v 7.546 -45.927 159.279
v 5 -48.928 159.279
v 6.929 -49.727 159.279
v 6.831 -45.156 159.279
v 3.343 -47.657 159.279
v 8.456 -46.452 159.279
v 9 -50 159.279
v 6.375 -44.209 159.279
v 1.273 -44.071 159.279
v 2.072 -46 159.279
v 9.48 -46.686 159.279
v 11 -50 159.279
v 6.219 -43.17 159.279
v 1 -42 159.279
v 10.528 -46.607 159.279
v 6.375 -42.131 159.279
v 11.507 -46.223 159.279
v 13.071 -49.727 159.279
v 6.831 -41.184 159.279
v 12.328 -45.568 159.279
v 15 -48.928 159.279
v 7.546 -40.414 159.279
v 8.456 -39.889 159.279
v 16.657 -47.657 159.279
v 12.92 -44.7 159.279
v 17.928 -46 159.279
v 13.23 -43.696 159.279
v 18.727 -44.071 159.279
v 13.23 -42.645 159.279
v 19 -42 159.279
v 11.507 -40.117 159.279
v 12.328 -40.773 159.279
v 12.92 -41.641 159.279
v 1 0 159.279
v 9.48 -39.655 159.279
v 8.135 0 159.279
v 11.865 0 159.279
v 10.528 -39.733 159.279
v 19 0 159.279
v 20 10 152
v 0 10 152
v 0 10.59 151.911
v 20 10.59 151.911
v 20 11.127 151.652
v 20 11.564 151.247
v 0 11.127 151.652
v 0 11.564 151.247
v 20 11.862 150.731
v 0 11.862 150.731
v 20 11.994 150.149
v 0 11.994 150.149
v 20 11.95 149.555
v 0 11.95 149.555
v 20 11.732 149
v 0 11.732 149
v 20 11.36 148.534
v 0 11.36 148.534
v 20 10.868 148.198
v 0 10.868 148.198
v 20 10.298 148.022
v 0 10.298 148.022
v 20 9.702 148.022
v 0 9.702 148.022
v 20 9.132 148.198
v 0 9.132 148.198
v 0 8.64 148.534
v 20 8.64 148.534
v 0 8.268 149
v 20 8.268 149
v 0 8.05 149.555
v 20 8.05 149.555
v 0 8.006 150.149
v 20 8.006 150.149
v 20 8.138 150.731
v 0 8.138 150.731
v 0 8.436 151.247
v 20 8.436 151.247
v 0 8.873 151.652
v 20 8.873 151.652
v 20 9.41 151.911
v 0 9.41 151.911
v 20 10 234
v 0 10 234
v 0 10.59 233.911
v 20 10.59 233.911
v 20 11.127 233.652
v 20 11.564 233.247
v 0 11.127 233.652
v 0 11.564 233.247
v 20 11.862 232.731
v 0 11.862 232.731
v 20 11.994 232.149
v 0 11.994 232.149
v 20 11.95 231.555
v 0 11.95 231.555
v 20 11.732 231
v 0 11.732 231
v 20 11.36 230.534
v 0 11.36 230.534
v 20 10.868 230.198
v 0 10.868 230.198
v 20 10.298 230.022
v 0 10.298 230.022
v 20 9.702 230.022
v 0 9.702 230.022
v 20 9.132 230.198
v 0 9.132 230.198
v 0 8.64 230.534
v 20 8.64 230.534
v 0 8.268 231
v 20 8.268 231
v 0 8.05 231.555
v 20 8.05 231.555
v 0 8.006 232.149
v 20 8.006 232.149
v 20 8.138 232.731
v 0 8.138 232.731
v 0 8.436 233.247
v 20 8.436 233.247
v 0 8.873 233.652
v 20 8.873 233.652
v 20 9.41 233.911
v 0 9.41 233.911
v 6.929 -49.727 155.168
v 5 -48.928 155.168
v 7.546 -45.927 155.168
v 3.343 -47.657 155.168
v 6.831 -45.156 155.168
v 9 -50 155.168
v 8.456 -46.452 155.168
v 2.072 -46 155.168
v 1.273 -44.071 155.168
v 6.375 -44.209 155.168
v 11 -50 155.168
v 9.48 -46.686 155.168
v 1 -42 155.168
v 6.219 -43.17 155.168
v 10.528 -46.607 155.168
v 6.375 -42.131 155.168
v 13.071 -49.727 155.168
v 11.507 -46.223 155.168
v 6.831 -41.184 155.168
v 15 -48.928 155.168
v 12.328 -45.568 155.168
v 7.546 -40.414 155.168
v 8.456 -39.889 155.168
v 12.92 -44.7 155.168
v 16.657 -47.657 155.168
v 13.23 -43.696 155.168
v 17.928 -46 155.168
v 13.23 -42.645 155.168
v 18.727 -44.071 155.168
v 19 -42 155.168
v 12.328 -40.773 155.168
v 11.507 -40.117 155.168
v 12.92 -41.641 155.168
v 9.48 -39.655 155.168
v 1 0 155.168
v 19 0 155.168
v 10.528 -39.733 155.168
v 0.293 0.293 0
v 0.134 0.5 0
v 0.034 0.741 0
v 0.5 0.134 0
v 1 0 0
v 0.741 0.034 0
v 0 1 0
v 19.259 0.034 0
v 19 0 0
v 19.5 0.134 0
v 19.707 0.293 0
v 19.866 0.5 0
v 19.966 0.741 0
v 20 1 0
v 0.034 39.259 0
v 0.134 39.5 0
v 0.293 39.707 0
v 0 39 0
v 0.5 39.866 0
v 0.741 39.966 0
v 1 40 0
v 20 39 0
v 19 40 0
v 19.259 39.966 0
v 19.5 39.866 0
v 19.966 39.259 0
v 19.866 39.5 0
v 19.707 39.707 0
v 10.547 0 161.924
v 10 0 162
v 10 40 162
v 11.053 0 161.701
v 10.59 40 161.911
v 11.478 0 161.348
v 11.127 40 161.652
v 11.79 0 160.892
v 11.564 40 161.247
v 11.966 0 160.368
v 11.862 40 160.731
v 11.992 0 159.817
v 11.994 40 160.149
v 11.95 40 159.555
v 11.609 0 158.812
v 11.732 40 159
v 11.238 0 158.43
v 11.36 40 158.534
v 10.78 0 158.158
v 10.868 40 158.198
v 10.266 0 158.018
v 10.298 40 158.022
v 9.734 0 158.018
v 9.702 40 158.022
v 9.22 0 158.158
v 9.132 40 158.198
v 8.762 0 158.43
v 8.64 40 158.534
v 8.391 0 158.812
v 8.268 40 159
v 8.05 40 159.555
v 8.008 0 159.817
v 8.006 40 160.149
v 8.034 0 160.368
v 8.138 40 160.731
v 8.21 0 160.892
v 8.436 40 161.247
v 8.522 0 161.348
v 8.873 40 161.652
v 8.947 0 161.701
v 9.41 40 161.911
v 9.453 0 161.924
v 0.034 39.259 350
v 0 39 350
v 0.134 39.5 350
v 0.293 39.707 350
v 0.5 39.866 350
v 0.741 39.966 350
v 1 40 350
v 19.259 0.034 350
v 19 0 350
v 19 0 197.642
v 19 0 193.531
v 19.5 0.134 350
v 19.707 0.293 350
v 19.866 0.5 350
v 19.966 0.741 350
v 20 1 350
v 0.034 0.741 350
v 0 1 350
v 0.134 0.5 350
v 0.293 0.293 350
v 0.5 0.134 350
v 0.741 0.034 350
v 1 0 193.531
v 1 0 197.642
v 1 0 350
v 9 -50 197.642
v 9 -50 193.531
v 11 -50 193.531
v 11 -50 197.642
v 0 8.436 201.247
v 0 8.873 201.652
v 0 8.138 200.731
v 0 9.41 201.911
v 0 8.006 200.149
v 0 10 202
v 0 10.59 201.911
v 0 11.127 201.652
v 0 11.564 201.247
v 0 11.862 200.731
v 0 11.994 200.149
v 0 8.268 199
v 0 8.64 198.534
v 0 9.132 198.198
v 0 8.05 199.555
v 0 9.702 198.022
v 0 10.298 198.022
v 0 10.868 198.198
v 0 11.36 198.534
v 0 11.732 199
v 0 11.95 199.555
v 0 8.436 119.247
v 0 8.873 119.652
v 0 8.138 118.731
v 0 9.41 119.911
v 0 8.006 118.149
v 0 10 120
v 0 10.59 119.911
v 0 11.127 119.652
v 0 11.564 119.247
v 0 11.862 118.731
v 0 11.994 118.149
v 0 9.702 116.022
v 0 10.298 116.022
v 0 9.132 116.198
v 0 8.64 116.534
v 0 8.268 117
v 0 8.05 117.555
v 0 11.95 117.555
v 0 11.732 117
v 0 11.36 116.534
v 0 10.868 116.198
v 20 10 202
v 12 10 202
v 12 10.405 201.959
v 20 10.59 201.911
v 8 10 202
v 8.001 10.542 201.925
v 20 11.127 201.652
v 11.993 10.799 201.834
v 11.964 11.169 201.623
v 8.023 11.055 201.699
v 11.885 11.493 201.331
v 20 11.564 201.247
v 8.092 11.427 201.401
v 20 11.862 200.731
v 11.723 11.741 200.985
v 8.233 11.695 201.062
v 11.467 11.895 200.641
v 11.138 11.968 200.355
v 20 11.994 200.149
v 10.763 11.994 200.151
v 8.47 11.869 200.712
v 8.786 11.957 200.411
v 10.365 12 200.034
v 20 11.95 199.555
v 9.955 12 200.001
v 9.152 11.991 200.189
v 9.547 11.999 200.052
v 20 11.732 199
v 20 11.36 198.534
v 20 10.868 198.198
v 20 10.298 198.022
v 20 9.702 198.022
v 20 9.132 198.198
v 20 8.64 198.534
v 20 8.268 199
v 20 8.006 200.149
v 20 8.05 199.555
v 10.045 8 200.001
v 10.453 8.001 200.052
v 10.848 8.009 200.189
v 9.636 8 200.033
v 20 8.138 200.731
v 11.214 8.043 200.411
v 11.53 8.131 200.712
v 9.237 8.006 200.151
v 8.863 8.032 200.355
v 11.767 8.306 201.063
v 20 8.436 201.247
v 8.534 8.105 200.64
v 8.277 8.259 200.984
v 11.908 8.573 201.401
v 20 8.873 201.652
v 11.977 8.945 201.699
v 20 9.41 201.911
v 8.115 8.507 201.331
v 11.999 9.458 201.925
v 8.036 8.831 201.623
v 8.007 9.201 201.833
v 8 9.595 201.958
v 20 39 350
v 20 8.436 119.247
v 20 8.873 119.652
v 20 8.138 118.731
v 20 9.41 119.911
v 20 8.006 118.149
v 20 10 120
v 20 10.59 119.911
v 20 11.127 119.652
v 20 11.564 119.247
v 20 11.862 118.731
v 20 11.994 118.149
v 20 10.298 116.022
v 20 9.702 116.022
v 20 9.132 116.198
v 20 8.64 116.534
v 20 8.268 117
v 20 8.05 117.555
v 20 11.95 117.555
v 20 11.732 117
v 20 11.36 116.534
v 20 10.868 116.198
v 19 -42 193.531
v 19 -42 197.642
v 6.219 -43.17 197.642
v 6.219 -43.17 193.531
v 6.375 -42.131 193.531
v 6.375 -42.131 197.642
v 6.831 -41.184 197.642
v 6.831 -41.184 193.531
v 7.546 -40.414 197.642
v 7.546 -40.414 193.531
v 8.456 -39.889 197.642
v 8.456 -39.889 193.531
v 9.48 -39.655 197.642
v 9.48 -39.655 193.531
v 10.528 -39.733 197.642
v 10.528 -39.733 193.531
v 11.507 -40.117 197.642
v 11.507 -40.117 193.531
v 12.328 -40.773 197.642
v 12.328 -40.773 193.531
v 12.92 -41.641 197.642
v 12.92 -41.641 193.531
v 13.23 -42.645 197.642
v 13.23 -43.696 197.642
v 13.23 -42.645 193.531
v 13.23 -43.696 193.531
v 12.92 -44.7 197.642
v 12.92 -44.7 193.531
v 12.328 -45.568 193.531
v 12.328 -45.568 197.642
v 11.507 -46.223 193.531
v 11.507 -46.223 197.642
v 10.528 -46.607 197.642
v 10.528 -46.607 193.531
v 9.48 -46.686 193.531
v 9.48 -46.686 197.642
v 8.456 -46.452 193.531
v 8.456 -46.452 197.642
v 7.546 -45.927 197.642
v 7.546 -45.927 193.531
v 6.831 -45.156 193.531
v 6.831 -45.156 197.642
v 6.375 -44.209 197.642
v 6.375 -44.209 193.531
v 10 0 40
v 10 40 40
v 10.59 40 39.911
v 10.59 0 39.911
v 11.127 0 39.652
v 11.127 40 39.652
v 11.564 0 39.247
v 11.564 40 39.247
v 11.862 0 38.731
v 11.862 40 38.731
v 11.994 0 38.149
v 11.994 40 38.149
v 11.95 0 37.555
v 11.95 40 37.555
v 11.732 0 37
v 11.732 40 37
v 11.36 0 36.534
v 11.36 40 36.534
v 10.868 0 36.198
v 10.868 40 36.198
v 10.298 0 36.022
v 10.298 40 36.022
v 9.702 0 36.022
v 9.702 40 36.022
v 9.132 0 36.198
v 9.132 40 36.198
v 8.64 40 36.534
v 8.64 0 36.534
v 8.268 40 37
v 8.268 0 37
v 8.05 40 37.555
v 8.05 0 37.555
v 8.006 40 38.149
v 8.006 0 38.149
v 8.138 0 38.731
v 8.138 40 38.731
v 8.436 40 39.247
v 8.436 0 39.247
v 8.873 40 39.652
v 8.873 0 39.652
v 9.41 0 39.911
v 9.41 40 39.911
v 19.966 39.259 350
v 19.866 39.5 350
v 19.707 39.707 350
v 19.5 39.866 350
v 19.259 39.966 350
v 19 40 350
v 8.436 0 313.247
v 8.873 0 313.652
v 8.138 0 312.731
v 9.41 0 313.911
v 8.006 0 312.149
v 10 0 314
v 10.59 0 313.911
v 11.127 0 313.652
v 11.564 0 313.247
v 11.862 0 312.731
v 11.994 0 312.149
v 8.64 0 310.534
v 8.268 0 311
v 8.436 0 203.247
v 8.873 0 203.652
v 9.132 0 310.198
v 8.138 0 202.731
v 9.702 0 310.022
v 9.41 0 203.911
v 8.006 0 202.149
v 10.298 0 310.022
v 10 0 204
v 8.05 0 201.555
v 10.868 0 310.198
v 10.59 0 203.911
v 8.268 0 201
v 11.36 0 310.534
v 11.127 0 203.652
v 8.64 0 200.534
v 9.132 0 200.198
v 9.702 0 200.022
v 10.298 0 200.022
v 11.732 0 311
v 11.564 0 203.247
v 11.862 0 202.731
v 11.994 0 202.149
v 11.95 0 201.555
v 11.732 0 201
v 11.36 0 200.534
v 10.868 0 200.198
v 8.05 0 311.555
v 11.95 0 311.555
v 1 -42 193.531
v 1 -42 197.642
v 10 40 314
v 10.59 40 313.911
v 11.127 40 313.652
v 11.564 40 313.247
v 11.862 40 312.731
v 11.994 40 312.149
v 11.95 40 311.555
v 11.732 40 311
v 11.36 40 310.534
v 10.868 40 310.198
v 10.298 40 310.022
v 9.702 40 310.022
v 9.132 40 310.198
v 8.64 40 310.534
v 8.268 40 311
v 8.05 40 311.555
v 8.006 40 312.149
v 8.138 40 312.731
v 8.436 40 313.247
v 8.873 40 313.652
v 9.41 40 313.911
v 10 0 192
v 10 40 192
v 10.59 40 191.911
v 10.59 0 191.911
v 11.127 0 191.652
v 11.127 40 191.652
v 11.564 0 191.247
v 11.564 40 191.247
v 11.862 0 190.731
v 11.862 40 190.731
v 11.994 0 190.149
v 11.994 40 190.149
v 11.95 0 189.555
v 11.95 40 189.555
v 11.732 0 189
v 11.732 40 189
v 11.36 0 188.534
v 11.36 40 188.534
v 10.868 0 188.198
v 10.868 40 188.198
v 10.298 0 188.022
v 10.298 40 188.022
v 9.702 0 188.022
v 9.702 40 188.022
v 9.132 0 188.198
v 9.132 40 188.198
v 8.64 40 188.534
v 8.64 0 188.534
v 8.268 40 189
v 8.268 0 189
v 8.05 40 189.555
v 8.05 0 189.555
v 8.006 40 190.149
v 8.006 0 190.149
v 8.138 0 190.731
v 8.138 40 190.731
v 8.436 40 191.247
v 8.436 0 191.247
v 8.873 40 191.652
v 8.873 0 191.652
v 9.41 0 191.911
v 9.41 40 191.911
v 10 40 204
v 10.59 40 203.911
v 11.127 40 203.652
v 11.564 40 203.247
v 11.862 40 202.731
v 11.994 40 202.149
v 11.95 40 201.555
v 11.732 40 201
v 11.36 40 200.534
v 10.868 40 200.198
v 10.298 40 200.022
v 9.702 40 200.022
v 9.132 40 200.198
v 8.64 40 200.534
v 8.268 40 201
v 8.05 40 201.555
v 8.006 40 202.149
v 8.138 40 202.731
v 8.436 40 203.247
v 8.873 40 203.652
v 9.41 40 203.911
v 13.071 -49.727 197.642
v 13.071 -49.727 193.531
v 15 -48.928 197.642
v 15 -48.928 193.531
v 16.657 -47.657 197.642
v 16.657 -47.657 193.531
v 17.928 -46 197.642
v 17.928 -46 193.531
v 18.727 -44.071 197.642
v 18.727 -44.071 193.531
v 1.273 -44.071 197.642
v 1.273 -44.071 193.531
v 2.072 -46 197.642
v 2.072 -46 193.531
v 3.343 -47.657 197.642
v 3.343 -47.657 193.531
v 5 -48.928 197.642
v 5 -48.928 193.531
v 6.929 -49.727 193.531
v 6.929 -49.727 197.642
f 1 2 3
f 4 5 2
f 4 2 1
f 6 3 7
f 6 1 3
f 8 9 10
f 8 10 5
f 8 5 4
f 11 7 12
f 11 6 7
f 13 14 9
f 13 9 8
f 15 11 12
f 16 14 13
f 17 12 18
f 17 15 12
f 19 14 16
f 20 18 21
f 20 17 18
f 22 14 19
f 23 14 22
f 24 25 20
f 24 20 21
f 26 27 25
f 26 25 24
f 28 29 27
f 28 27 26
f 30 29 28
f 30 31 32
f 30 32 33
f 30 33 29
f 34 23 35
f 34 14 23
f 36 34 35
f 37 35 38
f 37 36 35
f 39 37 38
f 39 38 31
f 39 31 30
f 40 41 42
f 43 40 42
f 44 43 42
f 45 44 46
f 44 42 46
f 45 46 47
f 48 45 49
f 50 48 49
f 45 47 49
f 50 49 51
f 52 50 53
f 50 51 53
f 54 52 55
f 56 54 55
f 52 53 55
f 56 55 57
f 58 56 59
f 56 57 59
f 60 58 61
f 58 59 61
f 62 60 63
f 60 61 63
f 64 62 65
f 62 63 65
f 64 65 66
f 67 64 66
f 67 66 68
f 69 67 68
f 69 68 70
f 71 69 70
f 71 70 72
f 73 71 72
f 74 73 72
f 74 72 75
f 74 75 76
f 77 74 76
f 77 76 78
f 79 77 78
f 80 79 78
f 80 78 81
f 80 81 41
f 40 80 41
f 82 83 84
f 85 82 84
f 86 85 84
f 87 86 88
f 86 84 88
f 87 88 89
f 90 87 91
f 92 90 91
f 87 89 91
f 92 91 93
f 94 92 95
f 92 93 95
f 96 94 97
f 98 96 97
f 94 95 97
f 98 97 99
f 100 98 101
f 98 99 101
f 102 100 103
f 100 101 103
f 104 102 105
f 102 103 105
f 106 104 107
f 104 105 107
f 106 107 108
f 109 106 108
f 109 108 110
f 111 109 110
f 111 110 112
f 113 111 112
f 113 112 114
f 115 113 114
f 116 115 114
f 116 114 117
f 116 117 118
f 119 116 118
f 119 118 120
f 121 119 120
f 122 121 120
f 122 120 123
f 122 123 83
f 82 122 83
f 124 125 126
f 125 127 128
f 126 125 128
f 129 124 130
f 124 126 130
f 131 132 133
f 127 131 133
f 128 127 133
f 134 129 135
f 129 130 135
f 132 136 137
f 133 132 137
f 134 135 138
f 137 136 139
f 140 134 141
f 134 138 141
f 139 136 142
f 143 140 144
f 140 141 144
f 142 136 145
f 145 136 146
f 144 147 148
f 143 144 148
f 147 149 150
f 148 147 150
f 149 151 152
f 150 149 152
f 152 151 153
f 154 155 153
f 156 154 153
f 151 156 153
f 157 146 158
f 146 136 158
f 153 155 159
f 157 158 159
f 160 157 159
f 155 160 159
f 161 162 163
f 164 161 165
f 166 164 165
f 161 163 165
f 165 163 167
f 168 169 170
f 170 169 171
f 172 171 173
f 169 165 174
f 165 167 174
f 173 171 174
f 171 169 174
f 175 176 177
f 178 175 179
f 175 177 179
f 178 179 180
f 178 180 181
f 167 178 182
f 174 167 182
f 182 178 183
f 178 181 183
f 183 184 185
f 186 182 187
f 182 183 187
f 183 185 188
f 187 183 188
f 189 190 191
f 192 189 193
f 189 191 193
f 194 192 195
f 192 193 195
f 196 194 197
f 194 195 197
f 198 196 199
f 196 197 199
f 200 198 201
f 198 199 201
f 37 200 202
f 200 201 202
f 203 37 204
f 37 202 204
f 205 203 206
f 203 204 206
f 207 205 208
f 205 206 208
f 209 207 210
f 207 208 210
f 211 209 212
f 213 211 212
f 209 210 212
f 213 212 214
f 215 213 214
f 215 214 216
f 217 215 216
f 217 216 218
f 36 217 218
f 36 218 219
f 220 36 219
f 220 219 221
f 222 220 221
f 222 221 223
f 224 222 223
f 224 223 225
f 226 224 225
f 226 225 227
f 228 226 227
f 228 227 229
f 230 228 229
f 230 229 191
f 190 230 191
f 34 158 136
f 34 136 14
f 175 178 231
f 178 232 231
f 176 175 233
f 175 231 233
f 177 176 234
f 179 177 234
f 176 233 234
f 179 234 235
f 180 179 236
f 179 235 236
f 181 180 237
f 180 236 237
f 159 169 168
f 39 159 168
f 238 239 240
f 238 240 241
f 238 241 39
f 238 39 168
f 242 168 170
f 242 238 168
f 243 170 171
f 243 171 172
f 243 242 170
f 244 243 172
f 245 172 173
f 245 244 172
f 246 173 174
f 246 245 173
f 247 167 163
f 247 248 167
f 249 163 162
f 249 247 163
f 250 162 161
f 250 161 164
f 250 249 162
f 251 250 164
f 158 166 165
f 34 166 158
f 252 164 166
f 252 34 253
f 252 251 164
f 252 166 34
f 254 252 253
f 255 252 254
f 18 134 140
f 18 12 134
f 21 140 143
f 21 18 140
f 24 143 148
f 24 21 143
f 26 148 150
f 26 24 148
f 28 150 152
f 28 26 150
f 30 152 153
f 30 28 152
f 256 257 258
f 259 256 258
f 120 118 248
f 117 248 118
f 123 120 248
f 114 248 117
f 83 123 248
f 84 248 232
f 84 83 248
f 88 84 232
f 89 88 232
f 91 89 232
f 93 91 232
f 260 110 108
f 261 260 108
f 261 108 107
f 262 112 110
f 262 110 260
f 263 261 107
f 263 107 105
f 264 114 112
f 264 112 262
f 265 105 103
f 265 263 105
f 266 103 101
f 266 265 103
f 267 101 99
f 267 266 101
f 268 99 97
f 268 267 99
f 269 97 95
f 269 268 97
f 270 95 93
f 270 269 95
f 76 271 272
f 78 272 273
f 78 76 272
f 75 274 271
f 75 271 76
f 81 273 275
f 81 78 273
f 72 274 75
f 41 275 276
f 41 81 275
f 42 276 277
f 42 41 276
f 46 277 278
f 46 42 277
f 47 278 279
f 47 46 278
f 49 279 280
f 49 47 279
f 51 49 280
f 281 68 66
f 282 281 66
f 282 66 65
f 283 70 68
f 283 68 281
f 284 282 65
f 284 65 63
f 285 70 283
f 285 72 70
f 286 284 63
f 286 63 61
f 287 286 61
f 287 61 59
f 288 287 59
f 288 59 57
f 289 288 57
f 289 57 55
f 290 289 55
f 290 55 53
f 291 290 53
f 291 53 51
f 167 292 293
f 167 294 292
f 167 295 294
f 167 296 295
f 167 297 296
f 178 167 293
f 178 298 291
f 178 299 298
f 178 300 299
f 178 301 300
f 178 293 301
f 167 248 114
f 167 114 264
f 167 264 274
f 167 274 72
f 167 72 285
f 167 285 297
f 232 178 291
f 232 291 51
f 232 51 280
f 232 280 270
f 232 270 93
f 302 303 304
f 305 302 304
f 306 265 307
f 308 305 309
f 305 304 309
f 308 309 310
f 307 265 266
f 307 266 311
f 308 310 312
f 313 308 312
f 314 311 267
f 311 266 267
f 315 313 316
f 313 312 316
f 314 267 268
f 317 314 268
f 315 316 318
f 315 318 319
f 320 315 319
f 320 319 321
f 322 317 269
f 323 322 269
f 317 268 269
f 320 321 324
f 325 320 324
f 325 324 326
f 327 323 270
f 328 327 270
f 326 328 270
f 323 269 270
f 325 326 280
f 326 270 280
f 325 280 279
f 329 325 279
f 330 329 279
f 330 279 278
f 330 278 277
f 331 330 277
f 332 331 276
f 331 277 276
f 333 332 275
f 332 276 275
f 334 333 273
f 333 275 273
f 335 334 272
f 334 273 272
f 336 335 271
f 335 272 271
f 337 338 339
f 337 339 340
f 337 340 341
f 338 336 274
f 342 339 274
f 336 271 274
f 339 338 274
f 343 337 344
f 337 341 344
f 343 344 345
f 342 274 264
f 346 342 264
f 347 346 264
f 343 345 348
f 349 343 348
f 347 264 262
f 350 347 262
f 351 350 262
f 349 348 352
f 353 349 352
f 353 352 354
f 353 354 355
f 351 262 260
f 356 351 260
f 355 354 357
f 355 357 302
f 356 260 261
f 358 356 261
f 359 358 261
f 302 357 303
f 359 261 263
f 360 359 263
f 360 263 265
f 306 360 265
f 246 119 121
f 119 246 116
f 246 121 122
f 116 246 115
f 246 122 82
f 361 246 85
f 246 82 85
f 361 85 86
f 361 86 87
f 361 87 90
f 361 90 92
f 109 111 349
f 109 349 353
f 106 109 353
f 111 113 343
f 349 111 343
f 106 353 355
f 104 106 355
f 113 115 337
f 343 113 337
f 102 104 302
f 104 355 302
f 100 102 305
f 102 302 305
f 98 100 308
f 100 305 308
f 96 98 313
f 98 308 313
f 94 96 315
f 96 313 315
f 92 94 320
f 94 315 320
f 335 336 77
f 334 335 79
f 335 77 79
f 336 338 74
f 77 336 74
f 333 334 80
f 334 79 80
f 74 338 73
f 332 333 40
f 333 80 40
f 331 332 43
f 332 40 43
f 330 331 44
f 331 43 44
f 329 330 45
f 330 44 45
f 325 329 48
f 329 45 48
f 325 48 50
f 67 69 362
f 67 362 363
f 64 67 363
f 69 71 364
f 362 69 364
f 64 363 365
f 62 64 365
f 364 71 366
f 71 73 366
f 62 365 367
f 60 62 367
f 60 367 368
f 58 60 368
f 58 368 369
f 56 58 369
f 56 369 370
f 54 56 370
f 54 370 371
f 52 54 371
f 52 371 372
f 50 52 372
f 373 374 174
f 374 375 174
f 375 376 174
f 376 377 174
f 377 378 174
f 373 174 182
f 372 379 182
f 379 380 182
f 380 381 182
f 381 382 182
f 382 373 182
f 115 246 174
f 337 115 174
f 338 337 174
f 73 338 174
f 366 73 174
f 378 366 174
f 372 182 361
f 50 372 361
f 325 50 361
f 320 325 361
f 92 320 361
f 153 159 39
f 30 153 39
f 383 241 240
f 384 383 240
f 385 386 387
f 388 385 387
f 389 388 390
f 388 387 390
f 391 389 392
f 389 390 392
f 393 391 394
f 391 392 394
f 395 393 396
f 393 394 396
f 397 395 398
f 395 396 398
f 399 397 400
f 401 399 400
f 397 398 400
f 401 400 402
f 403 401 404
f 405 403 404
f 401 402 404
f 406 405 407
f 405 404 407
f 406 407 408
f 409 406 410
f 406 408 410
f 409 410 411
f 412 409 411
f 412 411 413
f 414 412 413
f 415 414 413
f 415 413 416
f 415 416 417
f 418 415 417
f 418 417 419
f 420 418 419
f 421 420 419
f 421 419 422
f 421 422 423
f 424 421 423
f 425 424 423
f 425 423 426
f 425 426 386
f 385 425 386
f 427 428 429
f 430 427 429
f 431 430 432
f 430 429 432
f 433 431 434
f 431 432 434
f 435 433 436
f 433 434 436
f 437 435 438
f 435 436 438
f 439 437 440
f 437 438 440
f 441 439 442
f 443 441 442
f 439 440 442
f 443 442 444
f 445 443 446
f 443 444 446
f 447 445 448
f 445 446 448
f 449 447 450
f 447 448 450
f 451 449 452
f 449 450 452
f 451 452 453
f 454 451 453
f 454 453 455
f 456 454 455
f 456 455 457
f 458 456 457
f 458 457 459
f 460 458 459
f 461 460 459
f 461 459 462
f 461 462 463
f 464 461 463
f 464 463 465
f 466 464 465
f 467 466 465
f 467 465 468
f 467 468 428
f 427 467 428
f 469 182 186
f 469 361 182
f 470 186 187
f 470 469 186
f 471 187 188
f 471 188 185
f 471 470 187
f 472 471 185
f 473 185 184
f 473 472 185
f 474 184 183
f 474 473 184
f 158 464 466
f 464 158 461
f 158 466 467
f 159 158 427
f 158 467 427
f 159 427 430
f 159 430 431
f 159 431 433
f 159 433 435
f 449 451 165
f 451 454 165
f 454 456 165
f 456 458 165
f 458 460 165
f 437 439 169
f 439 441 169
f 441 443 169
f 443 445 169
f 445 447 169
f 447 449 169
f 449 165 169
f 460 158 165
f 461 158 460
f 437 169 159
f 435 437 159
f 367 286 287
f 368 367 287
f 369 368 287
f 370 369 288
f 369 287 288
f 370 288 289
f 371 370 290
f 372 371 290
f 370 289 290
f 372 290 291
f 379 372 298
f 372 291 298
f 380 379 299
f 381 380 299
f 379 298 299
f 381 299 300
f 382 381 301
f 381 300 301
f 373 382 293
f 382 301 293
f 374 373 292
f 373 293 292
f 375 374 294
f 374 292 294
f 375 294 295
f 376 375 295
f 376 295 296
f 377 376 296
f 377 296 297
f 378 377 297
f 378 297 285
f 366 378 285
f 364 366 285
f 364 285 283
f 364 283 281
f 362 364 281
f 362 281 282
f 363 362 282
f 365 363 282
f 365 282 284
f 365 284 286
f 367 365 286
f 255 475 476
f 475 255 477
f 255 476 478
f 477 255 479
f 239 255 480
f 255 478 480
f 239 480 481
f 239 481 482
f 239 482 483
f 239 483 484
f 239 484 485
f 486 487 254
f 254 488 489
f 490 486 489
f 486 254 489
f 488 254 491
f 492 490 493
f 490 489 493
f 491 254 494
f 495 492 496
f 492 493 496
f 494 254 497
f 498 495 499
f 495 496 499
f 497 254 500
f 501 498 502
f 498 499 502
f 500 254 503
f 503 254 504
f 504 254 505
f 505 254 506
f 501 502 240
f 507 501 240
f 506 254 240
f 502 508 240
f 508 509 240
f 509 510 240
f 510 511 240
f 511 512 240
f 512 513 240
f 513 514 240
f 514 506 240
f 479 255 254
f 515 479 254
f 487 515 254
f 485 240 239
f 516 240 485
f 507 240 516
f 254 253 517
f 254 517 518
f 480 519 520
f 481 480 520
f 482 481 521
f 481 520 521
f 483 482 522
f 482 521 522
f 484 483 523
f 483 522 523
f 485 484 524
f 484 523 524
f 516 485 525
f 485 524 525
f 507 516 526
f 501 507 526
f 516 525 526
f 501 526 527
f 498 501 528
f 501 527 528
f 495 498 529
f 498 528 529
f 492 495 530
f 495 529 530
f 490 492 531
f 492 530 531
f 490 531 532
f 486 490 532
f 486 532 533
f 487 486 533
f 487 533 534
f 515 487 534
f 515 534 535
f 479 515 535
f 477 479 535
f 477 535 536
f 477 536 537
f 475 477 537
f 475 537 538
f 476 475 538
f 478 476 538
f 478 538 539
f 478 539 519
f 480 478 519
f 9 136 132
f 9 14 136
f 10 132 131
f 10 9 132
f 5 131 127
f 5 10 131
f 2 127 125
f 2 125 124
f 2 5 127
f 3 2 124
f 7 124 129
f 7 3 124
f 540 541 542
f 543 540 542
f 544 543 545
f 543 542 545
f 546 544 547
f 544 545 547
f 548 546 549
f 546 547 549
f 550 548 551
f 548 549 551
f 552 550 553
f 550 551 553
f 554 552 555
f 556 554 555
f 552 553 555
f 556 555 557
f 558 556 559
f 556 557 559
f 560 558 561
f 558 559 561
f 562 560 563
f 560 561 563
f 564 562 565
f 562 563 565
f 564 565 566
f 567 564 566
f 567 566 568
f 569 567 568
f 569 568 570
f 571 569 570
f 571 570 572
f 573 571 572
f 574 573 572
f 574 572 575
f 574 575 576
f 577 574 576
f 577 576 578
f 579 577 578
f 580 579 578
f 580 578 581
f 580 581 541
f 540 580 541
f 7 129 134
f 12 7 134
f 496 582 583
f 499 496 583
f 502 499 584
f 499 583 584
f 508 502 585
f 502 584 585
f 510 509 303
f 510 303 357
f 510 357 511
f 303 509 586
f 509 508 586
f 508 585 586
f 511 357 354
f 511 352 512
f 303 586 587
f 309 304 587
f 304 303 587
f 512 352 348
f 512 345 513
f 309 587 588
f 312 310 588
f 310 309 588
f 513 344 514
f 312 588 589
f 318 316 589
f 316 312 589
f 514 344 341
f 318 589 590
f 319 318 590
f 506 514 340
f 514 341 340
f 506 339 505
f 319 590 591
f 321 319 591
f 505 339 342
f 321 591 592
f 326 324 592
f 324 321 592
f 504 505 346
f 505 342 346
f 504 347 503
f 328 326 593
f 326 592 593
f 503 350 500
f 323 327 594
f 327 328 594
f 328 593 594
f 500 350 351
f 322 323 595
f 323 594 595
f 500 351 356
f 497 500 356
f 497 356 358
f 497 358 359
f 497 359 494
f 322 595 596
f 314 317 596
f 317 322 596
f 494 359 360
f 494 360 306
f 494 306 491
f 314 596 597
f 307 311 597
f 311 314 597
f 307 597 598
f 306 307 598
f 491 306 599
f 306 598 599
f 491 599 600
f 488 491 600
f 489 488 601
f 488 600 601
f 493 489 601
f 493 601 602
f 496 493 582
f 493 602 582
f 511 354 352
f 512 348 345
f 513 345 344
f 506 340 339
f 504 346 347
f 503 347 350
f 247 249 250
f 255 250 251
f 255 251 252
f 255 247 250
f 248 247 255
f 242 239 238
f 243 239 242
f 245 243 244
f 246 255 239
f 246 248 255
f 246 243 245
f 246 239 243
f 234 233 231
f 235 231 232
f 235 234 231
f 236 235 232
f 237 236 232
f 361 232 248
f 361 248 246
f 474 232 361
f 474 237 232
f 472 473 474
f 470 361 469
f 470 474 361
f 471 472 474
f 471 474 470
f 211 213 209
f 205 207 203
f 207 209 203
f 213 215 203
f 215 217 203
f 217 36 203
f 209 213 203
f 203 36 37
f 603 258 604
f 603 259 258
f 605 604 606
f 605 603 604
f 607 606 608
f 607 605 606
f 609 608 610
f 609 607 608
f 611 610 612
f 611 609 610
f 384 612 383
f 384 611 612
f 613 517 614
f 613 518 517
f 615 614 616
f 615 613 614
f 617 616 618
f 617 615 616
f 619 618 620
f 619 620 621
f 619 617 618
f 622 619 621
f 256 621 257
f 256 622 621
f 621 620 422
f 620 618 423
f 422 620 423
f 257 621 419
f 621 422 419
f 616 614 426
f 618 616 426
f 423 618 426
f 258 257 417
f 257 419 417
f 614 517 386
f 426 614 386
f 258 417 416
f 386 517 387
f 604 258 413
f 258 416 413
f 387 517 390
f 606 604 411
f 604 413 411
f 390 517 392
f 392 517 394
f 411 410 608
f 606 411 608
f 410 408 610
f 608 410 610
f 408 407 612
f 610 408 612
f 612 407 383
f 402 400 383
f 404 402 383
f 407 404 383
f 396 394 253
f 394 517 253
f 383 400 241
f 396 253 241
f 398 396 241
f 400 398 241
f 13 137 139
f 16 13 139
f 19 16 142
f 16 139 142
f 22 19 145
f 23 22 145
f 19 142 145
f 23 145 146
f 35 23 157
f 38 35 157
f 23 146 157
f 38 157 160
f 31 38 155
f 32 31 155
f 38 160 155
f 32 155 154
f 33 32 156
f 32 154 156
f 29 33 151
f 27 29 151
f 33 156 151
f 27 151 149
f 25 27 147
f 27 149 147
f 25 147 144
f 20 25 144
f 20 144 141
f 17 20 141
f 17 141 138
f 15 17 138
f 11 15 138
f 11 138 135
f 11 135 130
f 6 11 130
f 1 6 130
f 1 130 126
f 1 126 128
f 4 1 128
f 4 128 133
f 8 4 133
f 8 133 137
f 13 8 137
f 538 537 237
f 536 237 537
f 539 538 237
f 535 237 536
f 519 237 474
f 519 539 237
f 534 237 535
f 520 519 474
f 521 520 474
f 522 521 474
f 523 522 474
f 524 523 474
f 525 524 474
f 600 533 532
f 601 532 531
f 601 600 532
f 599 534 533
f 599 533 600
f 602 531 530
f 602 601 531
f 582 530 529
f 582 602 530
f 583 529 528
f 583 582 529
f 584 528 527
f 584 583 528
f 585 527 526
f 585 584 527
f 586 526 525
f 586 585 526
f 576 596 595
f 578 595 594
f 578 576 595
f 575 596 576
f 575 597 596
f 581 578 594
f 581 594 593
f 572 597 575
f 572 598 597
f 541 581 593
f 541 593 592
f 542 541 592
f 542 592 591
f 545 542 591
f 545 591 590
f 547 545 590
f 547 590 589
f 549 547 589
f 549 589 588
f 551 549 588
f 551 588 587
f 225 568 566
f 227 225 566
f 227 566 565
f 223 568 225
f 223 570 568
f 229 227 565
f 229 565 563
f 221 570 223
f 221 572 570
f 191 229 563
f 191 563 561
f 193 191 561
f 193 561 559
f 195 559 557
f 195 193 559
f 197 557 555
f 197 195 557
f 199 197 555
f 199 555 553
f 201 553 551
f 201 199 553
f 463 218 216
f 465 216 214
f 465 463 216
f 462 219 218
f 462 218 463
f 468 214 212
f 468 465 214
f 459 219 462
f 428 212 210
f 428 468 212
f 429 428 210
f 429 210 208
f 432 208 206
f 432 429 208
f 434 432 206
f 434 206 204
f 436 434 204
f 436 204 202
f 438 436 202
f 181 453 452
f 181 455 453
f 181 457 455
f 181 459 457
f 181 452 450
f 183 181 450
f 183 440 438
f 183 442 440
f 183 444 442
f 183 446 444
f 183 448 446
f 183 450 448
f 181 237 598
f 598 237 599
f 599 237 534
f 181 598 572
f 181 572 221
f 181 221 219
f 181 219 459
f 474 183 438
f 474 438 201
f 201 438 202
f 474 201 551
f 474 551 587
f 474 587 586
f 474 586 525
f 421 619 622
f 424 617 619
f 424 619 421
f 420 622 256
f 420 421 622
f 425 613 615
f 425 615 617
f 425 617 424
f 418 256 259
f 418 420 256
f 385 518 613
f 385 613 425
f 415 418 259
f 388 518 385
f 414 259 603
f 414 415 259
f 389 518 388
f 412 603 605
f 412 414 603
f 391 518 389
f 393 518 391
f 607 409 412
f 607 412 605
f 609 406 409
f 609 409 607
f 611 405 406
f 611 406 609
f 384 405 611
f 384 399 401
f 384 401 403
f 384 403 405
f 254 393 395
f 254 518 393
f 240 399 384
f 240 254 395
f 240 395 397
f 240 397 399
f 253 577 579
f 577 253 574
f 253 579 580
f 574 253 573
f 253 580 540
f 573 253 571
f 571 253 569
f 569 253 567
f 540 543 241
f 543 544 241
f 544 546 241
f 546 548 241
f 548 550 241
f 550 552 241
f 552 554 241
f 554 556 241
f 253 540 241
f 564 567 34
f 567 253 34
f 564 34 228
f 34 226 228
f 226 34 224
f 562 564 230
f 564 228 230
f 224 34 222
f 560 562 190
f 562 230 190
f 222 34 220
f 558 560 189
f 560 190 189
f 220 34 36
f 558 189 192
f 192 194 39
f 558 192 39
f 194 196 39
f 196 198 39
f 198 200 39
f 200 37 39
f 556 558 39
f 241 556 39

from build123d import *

# Parameters (mm, degrees)
SKETCH_1_W          = 20
SKETCH_1_H          = 40
EXTRUDE_1_DEPTH     = 350
FILLET_1_R          = 1
SKETCH_2_R          = 2
CUT_EXTRUDE_1_DEPTH = 310
SKETCH_3_R          = 2
CUT_EXTRUDE_2_DEPTH = 90
SKETCH_4_W          = 18
SKETCH_4_H          = 4.110313015
EXTRUDE_2_DEPTH     = 50
SKETCH_5_R          = 3.525335322
CUT_EXTRUDE_3_DEPTH = 50
FILLET_2_R          = 8


with BuildPart() as part:
    # 草图1 → 凸台-拉伸1 (new body)
    with BuildSketch(Plane.XY):
        with Locations((10, 20)):
            Rectangle(SKETCH_1_W, SKETCH_1_H)
    extrude(amount=EXTRUDE_1_DEPTH)

    # 圆角1
    fillet_1_edges = [part.edges().sort_by_distance(p)[0] for p in [
        (0, 40, 175),
        (20, 40, 175),
        (20, 0, 175),
        (0, 0, 175),
    ]]
    fillet(fillet_1_edges, radius=FILLET_1_R)

    # 草图2 → 切除-拉伸1 (cut)
    with BuildSketch(Plane.ZY):
        with Locations((118, 10)):
            Circle(SKETCH_2_R)
        with Locations((232, 10)):
            Circle(SKETCH_2_R)
        with Locations((150, 10)):
            Circle(SKETCH_2_R)
        with Locations((200, 10)):
            Circle(SKETCH_2_R)
    extrude(amount=-CUT_EXTRUDE_1_DEPTH, mode=Mode.SUBTRACT)

    # 草图3 → 切除-拉伸2 (cut)
    with BuildSketch(Plane(origin=(0, 40, 0), x_dir=(1, 0, 0), z_dir=(0, 1, 0))):
        with Locations(Location((10, -38, 0), (0, 0, 270))):
            Circle(SKETCH_3_R)
        with Locations(Location((10, -312, 0), (0, 0, 270))):
            Circle(SKETCH_3_R)
        with Locations(Location((10, -160, 0), (0, 0, 270))):
            Circle(SKETCH_3_R)
        with Locations(Location((10, -190, 0), (0, 0, 270))):
            Circle(SKETCH_3_R)
        with Locations(Location((10, -202, 0), (0, 0, 270))):
            Circle(SKETCH_3_R)
    extrude(amount=-CUT_EXTRUDE_2_DEPTH, mode=Mode.SUBTRACT)

    # 草图4 → 凸台-拉伸2 (add)
    with BuildSketch(Plane.XZ):
        with Locations((10, 195.586566354)):
            Rectangle(SKETCH_4_W, SKETCH_4_H)
        with Locations((10, 157.223644883)):
            Rectangle(SKETCH_4_W, SKETCH_4_H)
    extrude(amount=EXTRUDE_2_DEPTH)

    # 草图5 → 切除-拉伸3 (cut)
    with BuildSketch(Plane(origin=(0, 0, 155.168488375), x_dir=(-1, 0, 0), z_dir=(0, 0, -1))):
        with Locations((-9.743882415, -43.170339686)):
            Circle(SKETCH_5_R)
    extrude(amount=-CUT_EXTRUDE_3_DEPTH, mode=Mode.SUBTRACT)

    # 圆角2
    fillet_2_edges = [part.edges().sort_by_distance(p)[0] for p in [
        (1, -50, 157.223644882),
        (19, -50, 157.223644882),
        (1, -50, 195.586566354),
        (19, -50, 195.586566354),
    ]]
    fillet(fillet_2_edges, radius=FILLET_2_R)


solid = part.part
